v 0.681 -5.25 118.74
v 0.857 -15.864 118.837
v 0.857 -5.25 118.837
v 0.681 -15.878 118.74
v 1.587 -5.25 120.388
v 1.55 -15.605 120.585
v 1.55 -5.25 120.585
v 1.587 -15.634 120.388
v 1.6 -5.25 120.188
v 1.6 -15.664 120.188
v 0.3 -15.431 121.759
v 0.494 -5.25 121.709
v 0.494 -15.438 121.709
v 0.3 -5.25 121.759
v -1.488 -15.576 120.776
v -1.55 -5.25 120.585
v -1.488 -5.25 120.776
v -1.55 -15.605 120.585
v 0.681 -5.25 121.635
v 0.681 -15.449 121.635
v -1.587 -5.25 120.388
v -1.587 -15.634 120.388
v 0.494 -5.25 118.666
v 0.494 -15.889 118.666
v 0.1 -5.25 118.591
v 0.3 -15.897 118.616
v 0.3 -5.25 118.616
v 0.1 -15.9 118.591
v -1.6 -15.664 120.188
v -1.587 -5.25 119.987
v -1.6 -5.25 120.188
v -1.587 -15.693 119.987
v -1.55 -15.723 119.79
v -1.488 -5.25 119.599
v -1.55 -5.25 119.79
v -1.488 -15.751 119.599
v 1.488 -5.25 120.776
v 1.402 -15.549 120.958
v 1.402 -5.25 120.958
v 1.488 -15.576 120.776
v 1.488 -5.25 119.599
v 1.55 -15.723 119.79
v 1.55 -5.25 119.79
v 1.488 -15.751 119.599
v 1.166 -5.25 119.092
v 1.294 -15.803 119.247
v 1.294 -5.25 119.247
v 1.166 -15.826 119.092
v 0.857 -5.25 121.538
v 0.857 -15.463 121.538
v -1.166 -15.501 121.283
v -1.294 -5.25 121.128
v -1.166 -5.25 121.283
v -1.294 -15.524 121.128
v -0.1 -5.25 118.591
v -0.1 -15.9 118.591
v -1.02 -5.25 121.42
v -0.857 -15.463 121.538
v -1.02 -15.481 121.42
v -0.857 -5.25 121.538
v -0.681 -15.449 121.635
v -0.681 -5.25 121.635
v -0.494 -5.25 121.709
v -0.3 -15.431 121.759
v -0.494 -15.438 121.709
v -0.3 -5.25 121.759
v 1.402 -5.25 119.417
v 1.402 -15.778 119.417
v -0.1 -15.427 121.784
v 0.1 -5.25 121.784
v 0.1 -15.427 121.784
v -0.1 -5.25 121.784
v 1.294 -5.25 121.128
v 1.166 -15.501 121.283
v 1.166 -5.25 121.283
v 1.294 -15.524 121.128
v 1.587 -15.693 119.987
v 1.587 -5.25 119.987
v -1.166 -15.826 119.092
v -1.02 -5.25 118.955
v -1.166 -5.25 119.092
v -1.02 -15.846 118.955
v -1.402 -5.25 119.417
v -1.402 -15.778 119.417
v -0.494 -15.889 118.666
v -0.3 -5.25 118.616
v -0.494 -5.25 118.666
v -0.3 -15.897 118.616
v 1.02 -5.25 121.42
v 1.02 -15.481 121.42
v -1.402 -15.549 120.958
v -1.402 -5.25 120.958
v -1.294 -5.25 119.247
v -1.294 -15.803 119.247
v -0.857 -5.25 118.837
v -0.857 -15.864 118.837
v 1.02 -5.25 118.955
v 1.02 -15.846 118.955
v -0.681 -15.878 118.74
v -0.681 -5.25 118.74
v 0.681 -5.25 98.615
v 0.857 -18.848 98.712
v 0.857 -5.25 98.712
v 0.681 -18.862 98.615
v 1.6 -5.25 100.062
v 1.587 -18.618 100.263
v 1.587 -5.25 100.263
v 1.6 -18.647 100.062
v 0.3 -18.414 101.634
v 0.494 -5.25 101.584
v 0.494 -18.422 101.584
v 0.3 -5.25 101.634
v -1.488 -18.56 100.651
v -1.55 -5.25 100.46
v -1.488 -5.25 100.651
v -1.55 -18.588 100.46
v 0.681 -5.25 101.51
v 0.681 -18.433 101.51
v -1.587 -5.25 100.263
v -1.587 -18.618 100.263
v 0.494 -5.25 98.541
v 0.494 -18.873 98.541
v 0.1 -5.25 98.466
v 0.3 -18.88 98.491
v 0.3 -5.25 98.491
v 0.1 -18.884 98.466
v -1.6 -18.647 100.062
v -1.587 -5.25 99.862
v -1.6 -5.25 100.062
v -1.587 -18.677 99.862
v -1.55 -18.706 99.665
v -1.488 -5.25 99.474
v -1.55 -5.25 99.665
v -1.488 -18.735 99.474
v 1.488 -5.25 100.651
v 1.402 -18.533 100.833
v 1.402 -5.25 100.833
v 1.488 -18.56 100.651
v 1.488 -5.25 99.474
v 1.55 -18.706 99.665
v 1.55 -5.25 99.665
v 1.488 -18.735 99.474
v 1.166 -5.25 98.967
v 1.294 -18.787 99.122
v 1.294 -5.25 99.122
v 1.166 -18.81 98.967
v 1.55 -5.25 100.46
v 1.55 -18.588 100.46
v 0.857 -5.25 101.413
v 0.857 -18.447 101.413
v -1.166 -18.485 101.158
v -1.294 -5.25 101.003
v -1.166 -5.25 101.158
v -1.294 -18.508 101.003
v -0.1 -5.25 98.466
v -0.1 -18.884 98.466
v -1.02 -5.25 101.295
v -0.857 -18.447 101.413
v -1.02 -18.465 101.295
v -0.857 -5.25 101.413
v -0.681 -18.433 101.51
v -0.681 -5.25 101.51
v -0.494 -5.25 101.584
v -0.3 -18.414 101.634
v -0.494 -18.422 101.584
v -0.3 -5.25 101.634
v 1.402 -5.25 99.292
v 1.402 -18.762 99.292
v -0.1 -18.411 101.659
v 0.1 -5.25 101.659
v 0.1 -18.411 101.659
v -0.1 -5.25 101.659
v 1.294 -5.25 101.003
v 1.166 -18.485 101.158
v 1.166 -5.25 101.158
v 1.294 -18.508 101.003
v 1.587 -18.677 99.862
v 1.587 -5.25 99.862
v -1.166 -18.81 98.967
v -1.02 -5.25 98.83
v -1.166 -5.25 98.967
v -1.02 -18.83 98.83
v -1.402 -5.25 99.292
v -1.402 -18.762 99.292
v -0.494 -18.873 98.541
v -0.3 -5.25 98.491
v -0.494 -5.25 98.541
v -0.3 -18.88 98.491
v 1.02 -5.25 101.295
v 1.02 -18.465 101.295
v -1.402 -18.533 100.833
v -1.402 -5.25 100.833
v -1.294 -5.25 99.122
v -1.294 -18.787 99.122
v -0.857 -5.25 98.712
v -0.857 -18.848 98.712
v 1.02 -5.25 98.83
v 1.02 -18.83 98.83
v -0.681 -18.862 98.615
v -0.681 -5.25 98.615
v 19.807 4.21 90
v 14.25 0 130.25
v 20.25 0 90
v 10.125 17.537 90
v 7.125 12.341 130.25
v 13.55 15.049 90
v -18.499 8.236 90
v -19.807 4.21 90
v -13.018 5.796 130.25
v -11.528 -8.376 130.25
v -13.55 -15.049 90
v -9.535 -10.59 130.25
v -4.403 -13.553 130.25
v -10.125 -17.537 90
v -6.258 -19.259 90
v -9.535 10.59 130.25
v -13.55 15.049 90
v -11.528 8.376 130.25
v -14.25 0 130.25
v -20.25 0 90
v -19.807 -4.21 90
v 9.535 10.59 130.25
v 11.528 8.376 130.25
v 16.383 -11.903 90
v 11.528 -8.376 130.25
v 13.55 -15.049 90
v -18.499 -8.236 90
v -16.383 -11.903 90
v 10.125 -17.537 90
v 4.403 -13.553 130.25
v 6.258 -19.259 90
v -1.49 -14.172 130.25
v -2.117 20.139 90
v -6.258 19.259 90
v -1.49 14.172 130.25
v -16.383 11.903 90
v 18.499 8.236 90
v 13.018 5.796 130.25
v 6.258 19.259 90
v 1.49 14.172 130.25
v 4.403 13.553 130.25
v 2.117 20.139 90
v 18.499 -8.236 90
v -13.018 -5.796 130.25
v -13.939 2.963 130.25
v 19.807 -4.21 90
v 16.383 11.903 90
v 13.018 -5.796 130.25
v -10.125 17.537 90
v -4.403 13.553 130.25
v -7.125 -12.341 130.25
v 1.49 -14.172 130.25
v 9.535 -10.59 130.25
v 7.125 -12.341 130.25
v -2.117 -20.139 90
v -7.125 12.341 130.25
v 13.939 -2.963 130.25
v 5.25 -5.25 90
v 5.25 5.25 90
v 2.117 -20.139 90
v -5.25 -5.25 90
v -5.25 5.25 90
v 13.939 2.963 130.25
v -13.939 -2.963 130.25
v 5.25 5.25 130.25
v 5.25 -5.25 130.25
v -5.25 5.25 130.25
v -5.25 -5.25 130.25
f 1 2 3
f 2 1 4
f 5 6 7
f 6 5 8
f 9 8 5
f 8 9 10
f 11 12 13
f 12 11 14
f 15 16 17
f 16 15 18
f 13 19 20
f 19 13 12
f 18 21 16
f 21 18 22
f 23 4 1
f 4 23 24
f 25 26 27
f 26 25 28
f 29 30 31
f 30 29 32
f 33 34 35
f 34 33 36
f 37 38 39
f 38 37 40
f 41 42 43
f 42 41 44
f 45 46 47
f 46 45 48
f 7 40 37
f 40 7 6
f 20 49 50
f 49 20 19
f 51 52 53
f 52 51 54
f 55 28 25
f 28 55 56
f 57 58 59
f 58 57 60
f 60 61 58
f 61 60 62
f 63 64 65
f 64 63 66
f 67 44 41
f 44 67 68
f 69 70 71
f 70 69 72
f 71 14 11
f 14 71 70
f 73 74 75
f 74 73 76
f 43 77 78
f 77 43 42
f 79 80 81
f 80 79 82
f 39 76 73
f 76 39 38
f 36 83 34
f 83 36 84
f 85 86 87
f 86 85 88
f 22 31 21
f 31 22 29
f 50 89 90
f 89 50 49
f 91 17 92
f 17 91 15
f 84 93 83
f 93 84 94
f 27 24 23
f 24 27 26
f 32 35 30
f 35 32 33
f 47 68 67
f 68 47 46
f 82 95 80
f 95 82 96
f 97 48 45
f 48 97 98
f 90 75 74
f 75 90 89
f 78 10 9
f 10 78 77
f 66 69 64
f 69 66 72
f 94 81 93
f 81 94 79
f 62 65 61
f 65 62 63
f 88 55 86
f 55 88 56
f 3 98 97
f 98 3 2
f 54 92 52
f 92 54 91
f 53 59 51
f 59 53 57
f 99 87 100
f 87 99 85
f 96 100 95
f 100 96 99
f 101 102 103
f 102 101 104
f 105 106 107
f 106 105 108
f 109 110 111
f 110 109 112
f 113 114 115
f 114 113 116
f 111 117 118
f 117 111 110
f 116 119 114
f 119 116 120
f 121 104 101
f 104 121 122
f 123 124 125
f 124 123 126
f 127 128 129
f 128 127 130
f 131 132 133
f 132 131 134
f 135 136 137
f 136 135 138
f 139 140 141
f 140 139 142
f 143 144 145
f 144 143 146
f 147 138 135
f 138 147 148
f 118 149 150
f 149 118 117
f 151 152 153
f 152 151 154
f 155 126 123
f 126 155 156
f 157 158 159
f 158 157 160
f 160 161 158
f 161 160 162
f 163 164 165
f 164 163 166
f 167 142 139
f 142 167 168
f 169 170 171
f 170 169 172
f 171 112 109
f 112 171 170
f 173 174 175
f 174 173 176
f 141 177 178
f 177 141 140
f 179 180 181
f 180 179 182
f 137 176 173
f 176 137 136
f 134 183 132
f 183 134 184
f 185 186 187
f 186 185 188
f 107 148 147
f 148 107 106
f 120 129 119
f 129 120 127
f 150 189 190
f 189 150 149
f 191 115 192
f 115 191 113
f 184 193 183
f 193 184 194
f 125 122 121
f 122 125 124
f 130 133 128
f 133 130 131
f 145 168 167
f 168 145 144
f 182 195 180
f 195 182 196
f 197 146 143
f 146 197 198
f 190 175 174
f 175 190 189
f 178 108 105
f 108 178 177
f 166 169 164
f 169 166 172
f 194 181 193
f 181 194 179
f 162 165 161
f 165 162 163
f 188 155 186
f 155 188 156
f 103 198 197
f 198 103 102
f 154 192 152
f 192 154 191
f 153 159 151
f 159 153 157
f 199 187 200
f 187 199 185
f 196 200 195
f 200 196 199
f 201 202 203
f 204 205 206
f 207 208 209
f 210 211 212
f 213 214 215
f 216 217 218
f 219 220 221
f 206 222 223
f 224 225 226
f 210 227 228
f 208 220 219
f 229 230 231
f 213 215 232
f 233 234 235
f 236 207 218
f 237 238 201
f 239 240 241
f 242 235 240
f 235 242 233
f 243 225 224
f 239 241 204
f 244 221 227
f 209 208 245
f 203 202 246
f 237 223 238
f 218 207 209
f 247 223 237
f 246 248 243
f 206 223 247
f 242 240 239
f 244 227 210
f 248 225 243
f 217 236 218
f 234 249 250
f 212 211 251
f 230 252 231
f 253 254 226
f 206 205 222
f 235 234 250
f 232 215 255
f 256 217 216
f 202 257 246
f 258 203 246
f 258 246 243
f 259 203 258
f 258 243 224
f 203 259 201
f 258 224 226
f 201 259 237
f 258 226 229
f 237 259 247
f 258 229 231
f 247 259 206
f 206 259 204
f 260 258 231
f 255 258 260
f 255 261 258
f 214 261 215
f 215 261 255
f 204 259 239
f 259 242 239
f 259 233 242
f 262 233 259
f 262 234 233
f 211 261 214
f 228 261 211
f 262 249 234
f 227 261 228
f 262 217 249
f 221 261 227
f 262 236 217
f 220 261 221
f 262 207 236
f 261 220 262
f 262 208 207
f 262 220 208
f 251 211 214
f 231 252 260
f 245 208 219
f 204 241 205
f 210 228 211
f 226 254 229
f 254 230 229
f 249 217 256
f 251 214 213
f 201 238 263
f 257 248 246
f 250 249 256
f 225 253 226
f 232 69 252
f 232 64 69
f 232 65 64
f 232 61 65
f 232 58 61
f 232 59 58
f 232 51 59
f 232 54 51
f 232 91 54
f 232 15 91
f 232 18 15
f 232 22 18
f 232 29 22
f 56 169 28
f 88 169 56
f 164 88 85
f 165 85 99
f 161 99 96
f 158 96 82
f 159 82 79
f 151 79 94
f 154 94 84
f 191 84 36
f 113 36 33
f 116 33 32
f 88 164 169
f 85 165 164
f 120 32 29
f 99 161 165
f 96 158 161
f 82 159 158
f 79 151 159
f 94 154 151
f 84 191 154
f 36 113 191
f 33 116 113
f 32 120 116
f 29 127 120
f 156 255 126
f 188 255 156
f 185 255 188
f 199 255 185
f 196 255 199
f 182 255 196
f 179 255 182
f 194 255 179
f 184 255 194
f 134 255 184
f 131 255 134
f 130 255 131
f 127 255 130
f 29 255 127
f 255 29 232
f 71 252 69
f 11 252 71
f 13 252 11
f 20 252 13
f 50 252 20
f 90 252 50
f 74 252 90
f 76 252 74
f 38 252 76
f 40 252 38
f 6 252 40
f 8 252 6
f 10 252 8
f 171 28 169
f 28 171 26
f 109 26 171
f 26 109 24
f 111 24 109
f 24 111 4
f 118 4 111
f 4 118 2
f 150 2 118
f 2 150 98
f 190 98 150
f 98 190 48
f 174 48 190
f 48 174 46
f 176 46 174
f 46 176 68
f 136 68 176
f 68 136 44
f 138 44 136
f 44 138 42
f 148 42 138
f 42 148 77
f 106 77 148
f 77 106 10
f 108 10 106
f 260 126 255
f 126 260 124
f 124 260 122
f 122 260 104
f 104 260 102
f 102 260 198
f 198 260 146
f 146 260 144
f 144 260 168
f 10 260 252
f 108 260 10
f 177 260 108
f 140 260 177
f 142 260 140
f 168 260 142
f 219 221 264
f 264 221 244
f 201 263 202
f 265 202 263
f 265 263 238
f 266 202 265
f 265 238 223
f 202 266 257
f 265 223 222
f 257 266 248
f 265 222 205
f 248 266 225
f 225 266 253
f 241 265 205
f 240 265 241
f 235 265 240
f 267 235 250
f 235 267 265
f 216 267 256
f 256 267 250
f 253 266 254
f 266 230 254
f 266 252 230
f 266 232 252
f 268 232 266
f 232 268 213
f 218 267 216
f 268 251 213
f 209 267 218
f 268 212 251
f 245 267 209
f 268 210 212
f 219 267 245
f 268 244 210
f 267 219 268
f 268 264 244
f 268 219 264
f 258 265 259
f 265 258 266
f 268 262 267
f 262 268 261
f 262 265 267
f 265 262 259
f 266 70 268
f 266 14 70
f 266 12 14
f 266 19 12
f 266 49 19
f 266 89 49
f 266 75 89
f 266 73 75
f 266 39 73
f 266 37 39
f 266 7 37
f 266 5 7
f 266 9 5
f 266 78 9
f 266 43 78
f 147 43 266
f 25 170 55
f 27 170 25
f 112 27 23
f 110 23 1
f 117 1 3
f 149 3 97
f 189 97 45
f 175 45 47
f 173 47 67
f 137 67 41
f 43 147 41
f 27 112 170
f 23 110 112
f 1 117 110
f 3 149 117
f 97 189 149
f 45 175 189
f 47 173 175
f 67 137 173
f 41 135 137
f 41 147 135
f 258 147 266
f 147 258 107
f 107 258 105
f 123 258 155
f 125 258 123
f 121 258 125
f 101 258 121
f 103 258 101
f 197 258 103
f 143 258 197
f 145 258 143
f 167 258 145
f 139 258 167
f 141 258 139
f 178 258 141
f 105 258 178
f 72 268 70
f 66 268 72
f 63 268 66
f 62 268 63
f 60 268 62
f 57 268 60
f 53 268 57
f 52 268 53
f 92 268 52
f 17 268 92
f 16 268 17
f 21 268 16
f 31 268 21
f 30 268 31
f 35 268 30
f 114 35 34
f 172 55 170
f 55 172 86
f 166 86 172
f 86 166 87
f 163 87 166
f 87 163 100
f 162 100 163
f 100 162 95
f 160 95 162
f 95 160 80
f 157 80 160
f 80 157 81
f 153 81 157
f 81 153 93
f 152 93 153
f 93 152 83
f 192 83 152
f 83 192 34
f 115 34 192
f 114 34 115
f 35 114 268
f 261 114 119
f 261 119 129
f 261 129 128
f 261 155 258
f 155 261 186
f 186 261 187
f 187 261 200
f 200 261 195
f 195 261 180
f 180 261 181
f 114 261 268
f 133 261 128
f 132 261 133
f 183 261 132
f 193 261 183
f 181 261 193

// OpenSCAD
// vim:ts=4:sw=4:sts=4:et:ai:si:fdm=marker
//
// Make the varla stone holey and add a square hole to the top through which we'll ram a 10x10mm
// square alu tube for LED mounting, cooling and cable housing.
//
// Written by Roy Sigurd Karlsbakk <roy@karlsbakk.net> in August 2025.
//

// Functions
function b2i(b) = b ? 1 : 0;

// Variables
frame_filename = "varla_frame_bottom-r2.obj";
stone_filename = "varla_stone_bottom.obj";

alutubedim = [10.5,10.5,200];
krymp = [.97,.97,.97];

draw_stone_bottom = true;
draw_frame_bottom = false;
draw_stone_top = false;
draw_frame_top = false;

top_d = 28.5;
top_mid_d = 40.5;
bottom_mid_d = 66.5;
bottom_d = 82.5;

top_h = 130.25;
top_mid_h = 90.0;
bottom_mid_h = 28.75;
screw1_z = top_h - (top_h - top_mid_h) / 4;
screw2_z = top_h - (top_h - top_mid_h) / 4 * 3;

screw_d = 3.2;

plug_h = 30;

thickness = 1;

bugfix = $preview ? .1 : 0;

debug = true;

// Sanity check
draw_count = b2i(draw_stone_bottom) + b2i(draw_frame_bottom) + b2i(draw_stone_top) + b2i(draw_frame_top);
assert(draw_count == 1, str("draw count is ", draw_count, " and it should be 1"));

// Debug
if (debug) {
    echo(str("DEBUG: top_h is ", top_h, ", top_mid_h is ", top_mid_h, ", screw1_z is ", screw1_z, " and screw2_z is ", screw2_z));
}

// Stone first
module stone() {
    if (draw_stone_bottom) {
        difference() {
            import(stone_filename);

            translate([0,0,-bugfix]) {
                scale(krymp) {
                    translate([0,0,-5]) {
                        import(stone_filename);
                    }
                }
            }
        }
    }

    if (draw_frame_bottom) {
        translate([100,0,0]) {
            import(frame_filename);
        }
    }

    translate([0,0,top_mid_h]) {
        color("red") {
            cylinder(d1=top_mid_d, d2=top_d, h=top_h-top_mid_h);
        }
    }
}

module holey_stone(screws = true) {
    difference() {
        stone();

        // Square tube
        translate([-alutubedim[0]/2,-alutubedim[1]/2,0]) {
            cube(alutubedim);
        }

        // Screw holes
        if (screws) {
            translate([0, 0, screw1_z]) {
                rotate([90,0,0]) {
                    cylinder(d = screw_d, h = top_d, $fn = 50);
                }
            }
            translate([0, 0, screw2_z]) {
                rotate([90,0,0]) {
                    cylinder(d = screw_d, h = top_d, $fn = 50);
                }
            }
        }
    }
}

holey_stone();
